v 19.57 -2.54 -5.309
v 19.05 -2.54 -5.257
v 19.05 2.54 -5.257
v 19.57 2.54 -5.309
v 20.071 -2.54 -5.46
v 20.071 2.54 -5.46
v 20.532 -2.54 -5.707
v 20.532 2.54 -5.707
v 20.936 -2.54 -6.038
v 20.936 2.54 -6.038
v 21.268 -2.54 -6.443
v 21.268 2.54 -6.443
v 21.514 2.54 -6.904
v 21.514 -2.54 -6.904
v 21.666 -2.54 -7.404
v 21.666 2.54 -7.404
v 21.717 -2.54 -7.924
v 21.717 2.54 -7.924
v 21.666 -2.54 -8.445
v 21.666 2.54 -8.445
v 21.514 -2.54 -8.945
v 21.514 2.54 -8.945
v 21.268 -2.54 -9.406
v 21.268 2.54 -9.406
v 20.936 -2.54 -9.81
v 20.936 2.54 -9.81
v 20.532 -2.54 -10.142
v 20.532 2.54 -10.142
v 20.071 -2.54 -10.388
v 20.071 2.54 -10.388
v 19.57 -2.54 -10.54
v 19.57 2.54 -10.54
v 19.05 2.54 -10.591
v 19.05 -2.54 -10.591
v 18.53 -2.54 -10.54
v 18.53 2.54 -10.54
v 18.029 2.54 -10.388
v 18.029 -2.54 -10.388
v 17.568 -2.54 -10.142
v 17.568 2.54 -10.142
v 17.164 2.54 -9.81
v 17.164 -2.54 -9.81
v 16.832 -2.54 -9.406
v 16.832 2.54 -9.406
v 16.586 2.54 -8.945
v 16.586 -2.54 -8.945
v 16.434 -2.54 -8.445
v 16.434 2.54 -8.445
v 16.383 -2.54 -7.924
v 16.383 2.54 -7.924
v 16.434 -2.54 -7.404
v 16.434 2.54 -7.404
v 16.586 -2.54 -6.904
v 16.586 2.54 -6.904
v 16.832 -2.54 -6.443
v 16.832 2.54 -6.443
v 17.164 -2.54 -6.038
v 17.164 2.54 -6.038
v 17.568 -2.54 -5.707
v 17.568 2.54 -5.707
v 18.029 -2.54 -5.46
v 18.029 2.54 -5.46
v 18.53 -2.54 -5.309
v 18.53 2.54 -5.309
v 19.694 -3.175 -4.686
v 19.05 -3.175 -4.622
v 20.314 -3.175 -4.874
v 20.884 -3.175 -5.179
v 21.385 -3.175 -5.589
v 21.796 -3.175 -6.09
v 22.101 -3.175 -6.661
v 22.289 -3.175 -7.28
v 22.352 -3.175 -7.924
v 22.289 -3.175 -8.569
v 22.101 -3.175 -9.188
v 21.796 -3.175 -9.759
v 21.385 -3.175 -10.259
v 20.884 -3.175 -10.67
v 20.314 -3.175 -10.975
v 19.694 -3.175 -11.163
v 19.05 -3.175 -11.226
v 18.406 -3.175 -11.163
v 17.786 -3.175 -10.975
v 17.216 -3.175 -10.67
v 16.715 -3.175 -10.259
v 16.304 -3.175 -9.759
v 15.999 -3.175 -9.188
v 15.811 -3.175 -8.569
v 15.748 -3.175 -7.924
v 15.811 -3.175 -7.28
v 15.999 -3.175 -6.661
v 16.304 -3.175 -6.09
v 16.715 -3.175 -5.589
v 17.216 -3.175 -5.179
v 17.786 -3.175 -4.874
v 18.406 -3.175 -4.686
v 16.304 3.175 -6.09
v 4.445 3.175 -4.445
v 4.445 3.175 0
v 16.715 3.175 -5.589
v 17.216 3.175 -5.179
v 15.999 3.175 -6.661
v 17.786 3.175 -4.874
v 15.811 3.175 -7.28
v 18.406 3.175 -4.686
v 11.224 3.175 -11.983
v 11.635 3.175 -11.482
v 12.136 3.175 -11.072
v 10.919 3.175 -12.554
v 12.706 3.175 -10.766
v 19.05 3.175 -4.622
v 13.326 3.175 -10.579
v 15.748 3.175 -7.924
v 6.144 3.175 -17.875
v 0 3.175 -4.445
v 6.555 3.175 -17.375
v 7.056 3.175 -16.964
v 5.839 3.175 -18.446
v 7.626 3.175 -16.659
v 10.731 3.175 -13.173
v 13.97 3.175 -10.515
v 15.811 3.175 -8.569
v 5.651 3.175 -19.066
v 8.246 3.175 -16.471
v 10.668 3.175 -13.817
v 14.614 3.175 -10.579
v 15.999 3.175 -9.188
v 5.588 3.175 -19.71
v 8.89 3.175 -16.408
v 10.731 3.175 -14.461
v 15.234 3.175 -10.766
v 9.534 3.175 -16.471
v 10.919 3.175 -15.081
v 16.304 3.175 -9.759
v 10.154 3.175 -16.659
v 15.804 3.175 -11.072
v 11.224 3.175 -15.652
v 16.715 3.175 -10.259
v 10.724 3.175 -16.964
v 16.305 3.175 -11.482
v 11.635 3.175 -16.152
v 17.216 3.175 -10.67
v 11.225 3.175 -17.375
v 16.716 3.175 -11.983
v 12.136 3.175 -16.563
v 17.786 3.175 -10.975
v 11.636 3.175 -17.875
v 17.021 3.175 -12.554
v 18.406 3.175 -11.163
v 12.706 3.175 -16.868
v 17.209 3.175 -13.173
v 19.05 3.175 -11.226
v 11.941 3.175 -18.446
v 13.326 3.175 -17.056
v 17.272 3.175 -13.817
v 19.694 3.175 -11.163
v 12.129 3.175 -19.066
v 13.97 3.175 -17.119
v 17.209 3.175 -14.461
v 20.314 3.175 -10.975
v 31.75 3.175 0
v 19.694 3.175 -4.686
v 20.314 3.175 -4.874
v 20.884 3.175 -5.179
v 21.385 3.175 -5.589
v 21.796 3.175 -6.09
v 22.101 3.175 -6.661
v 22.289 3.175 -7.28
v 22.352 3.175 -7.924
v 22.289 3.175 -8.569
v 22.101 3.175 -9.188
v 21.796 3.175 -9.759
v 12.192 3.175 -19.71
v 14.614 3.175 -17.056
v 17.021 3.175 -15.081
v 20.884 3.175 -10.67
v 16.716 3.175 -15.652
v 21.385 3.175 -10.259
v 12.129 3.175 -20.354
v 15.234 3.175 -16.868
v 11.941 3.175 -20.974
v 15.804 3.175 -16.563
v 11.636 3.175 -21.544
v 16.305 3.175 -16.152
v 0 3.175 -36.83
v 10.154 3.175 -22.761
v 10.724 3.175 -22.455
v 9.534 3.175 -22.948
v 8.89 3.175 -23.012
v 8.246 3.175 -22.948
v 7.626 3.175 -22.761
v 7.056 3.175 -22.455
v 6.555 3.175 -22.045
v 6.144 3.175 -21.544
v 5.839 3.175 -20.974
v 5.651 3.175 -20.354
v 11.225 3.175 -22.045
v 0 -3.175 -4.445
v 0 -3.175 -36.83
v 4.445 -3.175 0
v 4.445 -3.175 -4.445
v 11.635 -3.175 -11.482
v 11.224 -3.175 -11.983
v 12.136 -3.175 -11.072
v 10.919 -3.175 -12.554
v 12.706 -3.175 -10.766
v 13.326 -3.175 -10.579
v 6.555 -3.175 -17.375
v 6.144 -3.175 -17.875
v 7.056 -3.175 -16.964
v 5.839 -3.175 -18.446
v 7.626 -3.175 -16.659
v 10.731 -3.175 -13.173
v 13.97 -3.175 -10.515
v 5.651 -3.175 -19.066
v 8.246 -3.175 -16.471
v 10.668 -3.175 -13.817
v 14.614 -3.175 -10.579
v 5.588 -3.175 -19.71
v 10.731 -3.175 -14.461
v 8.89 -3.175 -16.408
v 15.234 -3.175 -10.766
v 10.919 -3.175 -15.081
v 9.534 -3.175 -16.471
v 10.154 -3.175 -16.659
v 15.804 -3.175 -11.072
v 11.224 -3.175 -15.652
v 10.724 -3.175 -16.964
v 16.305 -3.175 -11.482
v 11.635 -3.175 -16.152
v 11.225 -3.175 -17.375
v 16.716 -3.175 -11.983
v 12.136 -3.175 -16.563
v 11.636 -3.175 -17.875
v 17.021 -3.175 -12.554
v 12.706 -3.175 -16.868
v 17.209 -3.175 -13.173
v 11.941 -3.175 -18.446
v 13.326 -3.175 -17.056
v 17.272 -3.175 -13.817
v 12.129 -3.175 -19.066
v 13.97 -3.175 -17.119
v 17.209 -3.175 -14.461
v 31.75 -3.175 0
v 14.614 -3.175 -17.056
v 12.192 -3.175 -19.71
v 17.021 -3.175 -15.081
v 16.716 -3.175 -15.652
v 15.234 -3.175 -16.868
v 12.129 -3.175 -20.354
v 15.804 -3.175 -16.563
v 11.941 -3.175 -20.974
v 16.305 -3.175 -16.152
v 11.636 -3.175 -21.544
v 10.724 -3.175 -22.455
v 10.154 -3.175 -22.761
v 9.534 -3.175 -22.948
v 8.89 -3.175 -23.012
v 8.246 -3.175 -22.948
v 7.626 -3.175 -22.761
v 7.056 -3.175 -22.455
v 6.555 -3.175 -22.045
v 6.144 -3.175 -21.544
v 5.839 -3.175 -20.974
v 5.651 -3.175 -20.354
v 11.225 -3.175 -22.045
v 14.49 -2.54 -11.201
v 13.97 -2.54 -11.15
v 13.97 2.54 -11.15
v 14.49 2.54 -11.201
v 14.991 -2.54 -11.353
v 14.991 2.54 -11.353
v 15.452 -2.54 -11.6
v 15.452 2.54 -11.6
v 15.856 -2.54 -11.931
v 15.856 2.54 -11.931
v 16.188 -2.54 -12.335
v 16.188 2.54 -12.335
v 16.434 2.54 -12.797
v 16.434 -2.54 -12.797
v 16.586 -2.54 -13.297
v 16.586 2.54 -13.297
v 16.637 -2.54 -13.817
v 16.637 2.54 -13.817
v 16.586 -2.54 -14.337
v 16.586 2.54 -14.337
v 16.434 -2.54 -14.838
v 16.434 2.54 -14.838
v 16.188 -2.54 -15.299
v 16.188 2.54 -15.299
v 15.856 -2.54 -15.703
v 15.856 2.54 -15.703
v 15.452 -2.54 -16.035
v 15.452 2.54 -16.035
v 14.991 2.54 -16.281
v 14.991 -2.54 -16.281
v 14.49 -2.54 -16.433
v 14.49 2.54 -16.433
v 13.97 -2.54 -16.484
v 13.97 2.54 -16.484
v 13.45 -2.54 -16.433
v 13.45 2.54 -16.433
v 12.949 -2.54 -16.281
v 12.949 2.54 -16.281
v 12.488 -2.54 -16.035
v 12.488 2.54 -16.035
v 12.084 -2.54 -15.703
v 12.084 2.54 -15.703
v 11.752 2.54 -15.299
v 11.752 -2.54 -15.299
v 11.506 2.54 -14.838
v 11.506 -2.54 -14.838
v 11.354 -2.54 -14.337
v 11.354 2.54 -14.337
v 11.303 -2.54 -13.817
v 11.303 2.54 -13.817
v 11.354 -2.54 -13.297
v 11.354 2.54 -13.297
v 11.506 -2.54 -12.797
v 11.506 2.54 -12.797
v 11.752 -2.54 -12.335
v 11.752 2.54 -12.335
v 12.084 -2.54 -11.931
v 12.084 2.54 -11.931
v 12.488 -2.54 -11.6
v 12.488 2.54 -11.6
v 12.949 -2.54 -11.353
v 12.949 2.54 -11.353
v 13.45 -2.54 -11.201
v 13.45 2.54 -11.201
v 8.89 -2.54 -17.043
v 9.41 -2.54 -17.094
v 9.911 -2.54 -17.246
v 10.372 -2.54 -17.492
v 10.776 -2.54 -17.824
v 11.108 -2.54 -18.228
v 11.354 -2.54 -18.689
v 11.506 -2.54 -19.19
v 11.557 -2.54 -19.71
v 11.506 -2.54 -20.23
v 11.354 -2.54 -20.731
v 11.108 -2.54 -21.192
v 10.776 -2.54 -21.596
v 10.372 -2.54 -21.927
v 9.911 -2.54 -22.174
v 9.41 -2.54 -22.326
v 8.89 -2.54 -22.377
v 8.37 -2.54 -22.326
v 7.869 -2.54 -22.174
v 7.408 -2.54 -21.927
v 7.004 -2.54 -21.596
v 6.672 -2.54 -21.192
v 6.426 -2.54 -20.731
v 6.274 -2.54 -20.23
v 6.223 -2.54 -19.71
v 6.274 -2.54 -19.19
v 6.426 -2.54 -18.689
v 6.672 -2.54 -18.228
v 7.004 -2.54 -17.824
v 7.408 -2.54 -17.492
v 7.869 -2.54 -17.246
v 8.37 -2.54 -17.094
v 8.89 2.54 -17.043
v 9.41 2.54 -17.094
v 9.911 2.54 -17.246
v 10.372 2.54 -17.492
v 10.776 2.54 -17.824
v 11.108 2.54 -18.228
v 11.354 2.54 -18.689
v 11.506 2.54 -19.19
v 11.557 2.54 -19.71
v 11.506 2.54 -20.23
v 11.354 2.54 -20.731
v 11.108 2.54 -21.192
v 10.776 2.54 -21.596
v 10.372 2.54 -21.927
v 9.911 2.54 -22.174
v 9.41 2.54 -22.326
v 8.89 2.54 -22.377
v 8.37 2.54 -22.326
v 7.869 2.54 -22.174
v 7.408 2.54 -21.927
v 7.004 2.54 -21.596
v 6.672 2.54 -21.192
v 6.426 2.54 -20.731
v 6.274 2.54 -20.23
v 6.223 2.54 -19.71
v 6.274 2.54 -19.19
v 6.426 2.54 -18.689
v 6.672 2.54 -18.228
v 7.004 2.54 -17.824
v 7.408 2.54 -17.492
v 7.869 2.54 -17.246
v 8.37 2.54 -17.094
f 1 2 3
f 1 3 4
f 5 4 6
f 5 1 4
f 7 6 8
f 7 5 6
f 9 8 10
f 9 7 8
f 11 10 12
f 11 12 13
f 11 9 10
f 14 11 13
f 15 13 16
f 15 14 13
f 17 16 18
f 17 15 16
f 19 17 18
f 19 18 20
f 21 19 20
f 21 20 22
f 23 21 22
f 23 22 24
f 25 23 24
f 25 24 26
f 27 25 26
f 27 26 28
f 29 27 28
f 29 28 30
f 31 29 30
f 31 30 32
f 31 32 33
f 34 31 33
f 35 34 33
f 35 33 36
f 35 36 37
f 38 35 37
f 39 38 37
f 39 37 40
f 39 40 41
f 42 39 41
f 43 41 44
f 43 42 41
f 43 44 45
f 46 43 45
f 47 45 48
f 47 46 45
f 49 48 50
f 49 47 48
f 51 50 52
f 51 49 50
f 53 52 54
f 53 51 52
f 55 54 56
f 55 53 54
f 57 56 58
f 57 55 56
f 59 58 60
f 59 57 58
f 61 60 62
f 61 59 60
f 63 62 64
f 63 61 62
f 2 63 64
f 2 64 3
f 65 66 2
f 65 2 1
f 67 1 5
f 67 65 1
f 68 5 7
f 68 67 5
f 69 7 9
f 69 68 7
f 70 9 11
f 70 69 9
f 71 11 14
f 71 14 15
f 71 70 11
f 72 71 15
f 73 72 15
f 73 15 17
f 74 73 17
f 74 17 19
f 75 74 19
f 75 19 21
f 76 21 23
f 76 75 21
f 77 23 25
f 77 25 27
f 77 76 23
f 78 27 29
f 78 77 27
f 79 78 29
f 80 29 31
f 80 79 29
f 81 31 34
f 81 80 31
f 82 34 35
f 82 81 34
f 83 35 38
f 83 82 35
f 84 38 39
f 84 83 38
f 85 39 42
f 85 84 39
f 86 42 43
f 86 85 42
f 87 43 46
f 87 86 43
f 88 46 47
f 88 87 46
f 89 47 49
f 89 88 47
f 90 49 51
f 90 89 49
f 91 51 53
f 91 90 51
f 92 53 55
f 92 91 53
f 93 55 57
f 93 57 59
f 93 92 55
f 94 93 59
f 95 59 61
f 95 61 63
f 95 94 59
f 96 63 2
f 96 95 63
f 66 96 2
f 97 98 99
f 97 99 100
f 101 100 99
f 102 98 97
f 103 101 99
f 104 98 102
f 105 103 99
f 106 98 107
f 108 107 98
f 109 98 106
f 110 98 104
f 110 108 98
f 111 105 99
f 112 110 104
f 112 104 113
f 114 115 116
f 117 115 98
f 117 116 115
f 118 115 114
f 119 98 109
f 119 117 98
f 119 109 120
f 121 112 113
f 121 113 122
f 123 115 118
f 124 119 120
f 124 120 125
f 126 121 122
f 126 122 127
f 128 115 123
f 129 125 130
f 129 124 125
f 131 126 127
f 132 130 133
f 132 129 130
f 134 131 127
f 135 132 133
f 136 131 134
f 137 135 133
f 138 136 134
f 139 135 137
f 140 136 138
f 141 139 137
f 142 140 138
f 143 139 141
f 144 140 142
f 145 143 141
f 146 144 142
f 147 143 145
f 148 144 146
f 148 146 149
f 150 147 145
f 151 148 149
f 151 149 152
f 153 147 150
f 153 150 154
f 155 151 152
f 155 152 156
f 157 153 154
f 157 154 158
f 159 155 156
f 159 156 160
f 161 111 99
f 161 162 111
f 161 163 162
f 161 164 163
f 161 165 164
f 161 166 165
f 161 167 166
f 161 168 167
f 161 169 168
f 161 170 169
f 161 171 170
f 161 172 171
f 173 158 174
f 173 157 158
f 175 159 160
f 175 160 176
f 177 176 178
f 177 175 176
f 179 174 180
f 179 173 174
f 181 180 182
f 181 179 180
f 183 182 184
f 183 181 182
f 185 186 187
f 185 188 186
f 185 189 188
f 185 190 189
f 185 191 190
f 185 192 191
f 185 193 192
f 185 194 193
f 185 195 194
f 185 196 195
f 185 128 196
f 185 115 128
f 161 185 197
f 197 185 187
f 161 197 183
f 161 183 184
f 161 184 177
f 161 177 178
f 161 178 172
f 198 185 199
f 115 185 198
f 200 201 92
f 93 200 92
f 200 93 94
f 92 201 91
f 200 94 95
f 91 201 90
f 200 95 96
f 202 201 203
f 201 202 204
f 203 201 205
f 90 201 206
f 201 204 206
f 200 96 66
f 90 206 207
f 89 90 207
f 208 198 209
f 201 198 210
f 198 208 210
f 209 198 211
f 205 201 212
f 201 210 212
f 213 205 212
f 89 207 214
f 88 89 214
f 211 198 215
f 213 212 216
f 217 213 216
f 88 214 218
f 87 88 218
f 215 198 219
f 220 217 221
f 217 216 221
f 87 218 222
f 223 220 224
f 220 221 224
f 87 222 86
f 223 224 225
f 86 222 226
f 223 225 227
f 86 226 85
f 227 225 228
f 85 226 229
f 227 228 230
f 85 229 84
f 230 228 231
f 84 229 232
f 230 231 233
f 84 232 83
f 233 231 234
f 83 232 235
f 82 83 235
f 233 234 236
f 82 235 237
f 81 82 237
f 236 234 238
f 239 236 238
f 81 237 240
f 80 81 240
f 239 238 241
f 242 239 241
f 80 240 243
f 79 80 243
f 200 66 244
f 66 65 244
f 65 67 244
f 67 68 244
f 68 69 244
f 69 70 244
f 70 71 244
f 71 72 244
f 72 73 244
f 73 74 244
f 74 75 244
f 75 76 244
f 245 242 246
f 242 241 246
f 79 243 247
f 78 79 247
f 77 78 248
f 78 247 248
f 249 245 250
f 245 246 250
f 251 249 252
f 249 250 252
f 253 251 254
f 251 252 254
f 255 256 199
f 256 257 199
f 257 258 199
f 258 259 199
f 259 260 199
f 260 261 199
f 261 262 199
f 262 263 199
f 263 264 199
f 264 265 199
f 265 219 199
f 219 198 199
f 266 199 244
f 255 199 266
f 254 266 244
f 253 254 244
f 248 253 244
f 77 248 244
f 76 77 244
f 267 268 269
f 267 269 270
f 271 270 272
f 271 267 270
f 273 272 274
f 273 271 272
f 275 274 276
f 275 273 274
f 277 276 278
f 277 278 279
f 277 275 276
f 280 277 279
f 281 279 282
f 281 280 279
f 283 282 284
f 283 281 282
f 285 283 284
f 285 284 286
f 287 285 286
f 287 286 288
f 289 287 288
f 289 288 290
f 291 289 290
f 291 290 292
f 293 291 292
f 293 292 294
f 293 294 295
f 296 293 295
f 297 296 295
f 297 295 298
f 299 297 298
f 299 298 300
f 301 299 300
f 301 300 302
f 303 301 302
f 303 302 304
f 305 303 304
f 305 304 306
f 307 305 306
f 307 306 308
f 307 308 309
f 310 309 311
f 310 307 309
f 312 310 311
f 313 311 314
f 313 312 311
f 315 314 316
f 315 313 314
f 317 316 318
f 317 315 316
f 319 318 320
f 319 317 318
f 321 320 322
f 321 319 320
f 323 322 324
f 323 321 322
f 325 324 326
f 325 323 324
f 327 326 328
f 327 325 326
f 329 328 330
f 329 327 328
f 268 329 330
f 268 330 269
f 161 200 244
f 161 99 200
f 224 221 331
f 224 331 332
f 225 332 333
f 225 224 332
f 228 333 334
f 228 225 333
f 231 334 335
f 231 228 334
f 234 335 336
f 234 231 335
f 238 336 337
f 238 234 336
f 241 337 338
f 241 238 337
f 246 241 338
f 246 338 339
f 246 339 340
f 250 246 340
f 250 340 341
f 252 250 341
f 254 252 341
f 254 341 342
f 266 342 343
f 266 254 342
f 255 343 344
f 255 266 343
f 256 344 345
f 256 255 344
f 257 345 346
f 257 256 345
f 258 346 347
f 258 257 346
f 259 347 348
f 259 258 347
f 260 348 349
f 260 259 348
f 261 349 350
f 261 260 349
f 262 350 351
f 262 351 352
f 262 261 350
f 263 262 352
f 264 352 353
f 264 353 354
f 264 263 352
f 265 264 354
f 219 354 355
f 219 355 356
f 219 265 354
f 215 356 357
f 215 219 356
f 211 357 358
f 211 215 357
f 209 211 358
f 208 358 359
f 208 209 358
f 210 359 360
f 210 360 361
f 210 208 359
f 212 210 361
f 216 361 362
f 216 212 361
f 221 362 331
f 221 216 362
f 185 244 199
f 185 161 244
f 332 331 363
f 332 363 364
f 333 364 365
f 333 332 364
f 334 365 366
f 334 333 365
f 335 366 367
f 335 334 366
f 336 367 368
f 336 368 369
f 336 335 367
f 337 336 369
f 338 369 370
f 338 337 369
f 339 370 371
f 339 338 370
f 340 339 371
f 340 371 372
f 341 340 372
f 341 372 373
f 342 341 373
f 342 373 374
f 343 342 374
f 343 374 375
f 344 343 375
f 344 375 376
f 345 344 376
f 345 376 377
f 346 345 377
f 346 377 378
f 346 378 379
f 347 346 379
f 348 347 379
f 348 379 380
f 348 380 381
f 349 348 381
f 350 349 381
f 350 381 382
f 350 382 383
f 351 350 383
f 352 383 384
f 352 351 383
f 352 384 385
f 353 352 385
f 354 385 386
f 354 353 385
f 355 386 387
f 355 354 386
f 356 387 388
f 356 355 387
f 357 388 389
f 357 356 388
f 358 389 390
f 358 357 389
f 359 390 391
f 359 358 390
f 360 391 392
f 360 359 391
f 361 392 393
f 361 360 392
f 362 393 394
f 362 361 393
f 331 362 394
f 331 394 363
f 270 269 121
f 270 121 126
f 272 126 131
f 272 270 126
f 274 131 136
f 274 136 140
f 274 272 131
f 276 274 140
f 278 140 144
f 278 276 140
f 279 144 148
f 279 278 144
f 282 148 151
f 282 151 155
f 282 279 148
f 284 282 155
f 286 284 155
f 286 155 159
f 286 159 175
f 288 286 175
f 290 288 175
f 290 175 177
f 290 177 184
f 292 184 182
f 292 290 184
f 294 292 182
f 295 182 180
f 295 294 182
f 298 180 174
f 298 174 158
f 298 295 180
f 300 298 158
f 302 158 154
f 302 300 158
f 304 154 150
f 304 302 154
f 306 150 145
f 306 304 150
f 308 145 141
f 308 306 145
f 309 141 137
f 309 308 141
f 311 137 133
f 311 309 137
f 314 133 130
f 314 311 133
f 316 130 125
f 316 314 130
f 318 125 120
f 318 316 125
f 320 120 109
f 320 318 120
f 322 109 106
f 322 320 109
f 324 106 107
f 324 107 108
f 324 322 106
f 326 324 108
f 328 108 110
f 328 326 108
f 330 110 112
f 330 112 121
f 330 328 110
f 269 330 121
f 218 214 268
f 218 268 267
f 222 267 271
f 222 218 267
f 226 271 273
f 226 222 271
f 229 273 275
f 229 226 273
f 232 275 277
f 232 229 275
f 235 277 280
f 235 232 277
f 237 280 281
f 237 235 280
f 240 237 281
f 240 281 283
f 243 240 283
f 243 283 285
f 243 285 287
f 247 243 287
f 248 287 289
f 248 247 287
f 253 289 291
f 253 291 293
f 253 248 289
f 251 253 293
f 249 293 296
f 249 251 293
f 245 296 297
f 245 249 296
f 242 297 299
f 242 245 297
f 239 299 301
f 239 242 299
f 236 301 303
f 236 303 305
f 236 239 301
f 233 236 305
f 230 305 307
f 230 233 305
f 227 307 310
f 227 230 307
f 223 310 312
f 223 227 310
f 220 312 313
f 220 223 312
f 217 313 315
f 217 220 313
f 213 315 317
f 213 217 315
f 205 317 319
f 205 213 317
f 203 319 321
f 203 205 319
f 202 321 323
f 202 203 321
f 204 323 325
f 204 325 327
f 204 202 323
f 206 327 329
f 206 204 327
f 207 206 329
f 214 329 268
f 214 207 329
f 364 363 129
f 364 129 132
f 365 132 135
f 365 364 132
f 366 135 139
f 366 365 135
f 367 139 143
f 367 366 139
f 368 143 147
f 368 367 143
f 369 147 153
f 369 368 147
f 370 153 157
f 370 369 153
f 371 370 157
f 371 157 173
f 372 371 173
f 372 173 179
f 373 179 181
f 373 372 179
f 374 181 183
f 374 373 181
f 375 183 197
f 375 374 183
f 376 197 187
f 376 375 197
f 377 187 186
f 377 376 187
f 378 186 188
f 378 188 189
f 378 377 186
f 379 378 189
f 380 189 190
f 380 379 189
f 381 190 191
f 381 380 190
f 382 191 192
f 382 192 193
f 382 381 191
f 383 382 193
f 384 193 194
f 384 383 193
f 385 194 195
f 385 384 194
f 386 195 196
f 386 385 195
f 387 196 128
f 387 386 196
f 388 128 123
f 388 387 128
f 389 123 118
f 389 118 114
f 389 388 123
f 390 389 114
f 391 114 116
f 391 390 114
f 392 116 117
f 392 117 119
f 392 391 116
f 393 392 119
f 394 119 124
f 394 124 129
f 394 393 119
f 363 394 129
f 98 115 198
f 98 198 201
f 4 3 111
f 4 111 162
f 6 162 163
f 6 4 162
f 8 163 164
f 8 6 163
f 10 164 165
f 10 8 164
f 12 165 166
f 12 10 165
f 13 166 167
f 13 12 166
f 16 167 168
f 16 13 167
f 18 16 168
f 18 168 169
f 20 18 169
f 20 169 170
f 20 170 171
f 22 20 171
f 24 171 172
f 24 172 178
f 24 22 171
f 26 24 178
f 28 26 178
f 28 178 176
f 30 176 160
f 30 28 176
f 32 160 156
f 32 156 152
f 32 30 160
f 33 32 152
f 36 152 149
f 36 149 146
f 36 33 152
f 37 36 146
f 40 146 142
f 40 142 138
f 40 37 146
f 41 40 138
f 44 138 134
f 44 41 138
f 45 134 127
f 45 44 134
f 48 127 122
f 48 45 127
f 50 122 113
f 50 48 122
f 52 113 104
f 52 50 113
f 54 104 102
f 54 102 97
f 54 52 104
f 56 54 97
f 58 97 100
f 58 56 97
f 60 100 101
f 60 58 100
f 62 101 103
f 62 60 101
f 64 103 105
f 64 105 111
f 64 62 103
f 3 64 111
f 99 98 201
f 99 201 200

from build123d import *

# Parameters (mm, degrees)
SKETCH1_R           = 2.667
BOSS_EXTRUDE1_DEPTH = 3.175
CHAMFER1_SIZE       = 0.635


with BuildPart() as part:
    # Sketch1 → Boss-Extrude1 (new, symmetric)
    with BuildSketch(Plane(origin=(0, 0, 0), x_dir=(1, 0, 0), z_dir=(0, 1, 0))):
        Polygon((0, 36.83), (0, 4.445), (4.445, 4.445), (4.445, 0), (31.75, 0), align=None)
        with Locations(Location((8.89, 19.709926136, 0), (0, 0, 270))):
            Circle(SKETCH1_R, mode=Mode.SUBTRACT)
        with Locations(Location((13.97, 13.817126136, 0), (0, 0, 270))):
            Circle(SKETCH1_R, mode=Mode.SUBTRACT)
        with Locations(Location((19.05, 7.924326136, 0), (0, 0, 270))):
            Circle(SKETCH1_R, mode=Mode.SUBTRACT)
    extrude(amount=BOSS_EXTRUDE1_DEPTH, both=True)

    # Chamfer1
    chamfer1_edges = [part.edges().sort_by_distance(p)[0] for p in [
        (8.89, -3.175, -22.376926136),
        (8.89, 3.175, -22.376926136),
        (13.97, -3.175, -16.484126136),
        (13.97, 3.175, -16.484126136),
        (19.05, -3.175, -10.591326136),
        (19.05, 3.175, -10.591326136),
    ]]
    chamfer(chamfer1_edges, length=CHAMFER1_SIZE)


solid = part.part
